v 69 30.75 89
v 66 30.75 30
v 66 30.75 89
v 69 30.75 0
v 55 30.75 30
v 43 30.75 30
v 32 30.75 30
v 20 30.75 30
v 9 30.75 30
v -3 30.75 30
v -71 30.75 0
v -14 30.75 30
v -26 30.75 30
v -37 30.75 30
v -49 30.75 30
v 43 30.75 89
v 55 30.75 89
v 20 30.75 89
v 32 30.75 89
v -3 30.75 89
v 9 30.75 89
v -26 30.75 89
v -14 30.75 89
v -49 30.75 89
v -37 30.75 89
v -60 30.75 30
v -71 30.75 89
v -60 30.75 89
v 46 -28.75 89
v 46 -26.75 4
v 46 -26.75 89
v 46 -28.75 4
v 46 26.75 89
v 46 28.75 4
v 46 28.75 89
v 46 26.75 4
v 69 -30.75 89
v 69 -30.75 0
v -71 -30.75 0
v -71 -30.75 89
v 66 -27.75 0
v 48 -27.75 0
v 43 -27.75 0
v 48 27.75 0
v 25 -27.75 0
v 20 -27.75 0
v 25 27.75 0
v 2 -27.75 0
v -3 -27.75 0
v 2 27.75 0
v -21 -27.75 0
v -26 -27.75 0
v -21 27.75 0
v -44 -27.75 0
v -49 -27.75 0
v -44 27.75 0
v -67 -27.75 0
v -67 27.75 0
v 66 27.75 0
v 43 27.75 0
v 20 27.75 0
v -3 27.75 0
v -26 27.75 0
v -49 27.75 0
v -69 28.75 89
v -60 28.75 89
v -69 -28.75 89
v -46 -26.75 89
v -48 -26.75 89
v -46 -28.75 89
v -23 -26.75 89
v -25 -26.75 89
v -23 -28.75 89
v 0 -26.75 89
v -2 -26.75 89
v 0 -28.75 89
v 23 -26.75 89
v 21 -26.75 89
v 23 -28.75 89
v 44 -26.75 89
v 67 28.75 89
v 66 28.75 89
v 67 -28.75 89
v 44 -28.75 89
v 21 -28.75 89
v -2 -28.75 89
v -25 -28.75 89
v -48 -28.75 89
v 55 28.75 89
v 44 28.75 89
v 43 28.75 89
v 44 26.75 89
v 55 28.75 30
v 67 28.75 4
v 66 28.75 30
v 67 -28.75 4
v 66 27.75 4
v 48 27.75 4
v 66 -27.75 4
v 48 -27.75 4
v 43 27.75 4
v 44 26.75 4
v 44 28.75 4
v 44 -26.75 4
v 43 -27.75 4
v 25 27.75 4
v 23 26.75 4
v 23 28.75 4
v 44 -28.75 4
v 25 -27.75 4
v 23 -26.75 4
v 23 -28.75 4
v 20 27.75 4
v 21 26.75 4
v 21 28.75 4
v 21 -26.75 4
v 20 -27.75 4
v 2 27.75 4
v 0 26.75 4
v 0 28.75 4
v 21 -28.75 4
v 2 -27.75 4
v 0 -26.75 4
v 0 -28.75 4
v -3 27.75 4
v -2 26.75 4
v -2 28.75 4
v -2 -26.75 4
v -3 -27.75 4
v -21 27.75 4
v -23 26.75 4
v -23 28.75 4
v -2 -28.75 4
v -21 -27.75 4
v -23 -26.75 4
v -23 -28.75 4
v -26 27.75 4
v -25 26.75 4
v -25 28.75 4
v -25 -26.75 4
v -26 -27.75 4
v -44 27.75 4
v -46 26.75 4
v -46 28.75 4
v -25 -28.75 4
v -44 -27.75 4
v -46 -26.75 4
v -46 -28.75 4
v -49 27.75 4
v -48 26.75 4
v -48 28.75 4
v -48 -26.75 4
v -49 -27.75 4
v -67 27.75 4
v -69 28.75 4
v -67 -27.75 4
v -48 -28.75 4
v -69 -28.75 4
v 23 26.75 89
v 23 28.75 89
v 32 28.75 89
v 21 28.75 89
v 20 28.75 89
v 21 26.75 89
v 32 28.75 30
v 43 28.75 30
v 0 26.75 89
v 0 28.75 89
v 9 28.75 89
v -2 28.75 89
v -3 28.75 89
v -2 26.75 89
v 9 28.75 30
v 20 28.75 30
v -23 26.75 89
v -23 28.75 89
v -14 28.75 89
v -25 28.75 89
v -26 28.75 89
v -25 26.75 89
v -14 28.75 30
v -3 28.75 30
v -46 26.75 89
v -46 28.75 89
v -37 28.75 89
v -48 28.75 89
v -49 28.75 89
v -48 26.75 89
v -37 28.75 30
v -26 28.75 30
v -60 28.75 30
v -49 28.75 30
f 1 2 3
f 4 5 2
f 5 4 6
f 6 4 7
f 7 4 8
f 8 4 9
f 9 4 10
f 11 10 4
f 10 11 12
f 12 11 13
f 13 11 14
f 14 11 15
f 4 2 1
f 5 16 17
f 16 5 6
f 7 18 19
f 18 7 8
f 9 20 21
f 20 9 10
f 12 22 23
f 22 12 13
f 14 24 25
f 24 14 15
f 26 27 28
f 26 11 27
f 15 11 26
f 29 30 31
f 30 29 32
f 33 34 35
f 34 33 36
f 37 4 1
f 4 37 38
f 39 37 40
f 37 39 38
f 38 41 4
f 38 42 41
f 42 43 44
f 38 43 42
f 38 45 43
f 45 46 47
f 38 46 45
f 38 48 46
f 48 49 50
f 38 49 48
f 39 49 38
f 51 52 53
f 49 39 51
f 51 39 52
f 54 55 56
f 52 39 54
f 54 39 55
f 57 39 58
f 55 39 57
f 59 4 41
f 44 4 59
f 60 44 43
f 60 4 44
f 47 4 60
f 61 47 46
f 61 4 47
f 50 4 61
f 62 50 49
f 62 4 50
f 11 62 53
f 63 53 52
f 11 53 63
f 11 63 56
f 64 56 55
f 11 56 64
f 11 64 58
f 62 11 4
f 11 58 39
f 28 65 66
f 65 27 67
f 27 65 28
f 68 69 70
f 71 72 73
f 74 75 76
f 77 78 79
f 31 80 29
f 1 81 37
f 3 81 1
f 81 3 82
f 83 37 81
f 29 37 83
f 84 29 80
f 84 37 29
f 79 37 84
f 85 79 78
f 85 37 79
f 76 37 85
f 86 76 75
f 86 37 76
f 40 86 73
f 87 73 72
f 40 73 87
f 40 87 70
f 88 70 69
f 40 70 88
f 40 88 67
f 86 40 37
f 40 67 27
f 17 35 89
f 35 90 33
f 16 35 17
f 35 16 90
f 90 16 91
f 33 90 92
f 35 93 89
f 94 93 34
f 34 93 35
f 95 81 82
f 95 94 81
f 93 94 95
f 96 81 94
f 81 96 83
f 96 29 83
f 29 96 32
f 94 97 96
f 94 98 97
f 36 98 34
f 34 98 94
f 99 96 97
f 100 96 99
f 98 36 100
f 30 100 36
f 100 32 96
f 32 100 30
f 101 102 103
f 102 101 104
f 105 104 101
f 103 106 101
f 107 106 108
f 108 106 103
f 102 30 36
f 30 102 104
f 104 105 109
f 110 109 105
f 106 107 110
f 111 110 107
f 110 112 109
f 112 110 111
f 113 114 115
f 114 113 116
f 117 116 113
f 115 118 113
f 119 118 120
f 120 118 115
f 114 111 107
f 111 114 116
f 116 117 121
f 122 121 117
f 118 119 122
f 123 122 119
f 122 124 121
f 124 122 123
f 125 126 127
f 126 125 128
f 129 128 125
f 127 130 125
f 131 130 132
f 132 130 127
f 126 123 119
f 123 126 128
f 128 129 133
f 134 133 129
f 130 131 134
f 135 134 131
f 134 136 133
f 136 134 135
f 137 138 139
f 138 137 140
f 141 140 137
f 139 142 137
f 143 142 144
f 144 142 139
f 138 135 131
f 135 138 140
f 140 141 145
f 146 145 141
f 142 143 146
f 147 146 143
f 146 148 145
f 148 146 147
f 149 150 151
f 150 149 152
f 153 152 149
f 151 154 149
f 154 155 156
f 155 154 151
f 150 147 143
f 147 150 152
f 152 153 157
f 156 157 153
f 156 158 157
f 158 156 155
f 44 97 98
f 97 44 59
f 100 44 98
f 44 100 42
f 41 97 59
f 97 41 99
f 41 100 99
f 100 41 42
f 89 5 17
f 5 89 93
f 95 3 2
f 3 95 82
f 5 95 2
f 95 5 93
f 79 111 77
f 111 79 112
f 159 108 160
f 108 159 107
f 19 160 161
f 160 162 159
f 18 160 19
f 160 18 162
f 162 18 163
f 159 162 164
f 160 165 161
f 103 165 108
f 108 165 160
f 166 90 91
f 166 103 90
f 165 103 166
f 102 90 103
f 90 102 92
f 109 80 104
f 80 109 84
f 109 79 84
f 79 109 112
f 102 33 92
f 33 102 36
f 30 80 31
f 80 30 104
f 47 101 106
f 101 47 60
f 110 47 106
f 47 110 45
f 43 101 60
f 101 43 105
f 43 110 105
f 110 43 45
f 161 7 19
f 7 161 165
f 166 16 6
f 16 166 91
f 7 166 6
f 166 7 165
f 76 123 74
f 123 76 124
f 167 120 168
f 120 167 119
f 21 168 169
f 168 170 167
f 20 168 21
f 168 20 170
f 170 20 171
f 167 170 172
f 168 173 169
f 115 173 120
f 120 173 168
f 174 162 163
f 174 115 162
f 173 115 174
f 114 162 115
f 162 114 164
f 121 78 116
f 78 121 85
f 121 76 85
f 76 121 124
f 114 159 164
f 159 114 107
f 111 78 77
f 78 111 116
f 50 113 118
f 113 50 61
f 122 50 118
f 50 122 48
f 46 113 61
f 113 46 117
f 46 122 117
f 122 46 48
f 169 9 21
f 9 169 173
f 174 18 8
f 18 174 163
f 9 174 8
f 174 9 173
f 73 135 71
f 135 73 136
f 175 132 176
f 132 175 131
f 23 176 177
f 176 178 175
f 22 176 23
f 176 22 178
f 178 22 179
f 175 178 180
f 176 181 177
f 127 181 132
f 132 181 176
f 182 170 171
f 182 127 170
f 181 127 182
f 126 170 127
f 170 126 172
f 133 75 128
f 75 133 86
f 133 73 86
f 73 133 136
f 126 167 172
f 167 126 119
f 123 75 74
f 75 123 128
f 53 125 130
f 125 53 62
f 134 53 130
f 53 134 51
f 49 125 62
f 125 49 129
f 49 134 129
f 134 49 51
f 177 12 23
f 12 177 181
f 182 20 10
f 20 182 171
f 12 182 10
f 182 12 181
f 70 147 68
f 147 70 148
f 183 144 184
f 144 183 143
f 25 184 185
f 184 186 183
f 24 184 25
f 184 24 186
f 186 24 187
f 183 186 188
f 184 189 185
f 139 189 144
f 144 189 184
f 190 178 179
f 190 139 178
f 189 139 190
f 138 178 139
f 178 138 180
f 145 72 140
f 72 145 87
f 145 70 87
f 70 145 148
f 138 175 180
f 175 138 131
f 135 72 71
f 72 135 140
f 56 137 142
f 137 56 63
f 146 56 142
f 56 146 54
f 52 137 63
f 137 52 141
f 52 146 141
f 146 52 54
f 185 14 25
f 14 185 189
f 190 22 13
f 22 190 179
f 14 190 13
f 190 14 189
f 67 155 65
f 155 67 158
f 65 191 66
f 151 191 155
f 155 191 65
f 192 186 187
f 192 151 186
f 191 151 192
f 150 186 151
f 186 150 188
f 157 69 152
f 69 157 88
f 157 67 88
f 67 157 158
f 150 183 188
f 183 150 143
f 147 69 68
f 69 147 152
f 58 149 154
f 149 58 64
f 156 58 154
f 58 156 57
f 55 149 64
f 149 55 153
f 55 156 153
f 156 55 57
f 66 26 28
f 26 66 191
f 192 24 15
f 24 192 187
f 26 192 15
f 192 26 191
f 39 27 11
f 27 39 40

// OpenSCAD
// preview[view:east, tilt:top]

/* [Global] */
//how many raspis to stack on each other
rack_height=6; //[1:10]


/* [Hidden] */
rpi_width=57.5;
rpi_length=87;
u_height=23;
wall=2;
ledge=2;
port_height=11;
port_len=61;

module rack_floor(){
cube([rpi_width+2*wall,rpi_length+wall,wall]);
}

module one_u(){
 difference(){
	cube([rpi_width+2*wall,rpi_length+wall,u_height]);
 // cut out main area
	translate([wall,-wall,wall])cube([rpi_width,rpi_length,u_height]);
  //cut floor
  translate([wall+ledge,-wall,-wall])cube([rpi_width-2*ledge,rpi_length,3*wall]);

  //back
	translate([wall+1,rpi_length-2*wall,ledge+1])cube([rpi_width-2,5*wall,u_height-1-2*wall]);
  //side ports
  translate([rpi_width,-wall,wall+1])cube([5*wall,port_len,port_height]);
 }
}

module raspi_rack(){
	rack_floor();
	for(i=[1:rack_height]){
		translate([0,0,(i-1)*u_height])one_u();
	}
	//roof
	translate([0,0,rack_height*u_height])rack_floor();
}

//rotate & center
translate([(rack_height*u_height)/2,-(rpi_width+2*wall)/2,rpi_length+wall])rotate([-90,0,90])raspi_rack();
